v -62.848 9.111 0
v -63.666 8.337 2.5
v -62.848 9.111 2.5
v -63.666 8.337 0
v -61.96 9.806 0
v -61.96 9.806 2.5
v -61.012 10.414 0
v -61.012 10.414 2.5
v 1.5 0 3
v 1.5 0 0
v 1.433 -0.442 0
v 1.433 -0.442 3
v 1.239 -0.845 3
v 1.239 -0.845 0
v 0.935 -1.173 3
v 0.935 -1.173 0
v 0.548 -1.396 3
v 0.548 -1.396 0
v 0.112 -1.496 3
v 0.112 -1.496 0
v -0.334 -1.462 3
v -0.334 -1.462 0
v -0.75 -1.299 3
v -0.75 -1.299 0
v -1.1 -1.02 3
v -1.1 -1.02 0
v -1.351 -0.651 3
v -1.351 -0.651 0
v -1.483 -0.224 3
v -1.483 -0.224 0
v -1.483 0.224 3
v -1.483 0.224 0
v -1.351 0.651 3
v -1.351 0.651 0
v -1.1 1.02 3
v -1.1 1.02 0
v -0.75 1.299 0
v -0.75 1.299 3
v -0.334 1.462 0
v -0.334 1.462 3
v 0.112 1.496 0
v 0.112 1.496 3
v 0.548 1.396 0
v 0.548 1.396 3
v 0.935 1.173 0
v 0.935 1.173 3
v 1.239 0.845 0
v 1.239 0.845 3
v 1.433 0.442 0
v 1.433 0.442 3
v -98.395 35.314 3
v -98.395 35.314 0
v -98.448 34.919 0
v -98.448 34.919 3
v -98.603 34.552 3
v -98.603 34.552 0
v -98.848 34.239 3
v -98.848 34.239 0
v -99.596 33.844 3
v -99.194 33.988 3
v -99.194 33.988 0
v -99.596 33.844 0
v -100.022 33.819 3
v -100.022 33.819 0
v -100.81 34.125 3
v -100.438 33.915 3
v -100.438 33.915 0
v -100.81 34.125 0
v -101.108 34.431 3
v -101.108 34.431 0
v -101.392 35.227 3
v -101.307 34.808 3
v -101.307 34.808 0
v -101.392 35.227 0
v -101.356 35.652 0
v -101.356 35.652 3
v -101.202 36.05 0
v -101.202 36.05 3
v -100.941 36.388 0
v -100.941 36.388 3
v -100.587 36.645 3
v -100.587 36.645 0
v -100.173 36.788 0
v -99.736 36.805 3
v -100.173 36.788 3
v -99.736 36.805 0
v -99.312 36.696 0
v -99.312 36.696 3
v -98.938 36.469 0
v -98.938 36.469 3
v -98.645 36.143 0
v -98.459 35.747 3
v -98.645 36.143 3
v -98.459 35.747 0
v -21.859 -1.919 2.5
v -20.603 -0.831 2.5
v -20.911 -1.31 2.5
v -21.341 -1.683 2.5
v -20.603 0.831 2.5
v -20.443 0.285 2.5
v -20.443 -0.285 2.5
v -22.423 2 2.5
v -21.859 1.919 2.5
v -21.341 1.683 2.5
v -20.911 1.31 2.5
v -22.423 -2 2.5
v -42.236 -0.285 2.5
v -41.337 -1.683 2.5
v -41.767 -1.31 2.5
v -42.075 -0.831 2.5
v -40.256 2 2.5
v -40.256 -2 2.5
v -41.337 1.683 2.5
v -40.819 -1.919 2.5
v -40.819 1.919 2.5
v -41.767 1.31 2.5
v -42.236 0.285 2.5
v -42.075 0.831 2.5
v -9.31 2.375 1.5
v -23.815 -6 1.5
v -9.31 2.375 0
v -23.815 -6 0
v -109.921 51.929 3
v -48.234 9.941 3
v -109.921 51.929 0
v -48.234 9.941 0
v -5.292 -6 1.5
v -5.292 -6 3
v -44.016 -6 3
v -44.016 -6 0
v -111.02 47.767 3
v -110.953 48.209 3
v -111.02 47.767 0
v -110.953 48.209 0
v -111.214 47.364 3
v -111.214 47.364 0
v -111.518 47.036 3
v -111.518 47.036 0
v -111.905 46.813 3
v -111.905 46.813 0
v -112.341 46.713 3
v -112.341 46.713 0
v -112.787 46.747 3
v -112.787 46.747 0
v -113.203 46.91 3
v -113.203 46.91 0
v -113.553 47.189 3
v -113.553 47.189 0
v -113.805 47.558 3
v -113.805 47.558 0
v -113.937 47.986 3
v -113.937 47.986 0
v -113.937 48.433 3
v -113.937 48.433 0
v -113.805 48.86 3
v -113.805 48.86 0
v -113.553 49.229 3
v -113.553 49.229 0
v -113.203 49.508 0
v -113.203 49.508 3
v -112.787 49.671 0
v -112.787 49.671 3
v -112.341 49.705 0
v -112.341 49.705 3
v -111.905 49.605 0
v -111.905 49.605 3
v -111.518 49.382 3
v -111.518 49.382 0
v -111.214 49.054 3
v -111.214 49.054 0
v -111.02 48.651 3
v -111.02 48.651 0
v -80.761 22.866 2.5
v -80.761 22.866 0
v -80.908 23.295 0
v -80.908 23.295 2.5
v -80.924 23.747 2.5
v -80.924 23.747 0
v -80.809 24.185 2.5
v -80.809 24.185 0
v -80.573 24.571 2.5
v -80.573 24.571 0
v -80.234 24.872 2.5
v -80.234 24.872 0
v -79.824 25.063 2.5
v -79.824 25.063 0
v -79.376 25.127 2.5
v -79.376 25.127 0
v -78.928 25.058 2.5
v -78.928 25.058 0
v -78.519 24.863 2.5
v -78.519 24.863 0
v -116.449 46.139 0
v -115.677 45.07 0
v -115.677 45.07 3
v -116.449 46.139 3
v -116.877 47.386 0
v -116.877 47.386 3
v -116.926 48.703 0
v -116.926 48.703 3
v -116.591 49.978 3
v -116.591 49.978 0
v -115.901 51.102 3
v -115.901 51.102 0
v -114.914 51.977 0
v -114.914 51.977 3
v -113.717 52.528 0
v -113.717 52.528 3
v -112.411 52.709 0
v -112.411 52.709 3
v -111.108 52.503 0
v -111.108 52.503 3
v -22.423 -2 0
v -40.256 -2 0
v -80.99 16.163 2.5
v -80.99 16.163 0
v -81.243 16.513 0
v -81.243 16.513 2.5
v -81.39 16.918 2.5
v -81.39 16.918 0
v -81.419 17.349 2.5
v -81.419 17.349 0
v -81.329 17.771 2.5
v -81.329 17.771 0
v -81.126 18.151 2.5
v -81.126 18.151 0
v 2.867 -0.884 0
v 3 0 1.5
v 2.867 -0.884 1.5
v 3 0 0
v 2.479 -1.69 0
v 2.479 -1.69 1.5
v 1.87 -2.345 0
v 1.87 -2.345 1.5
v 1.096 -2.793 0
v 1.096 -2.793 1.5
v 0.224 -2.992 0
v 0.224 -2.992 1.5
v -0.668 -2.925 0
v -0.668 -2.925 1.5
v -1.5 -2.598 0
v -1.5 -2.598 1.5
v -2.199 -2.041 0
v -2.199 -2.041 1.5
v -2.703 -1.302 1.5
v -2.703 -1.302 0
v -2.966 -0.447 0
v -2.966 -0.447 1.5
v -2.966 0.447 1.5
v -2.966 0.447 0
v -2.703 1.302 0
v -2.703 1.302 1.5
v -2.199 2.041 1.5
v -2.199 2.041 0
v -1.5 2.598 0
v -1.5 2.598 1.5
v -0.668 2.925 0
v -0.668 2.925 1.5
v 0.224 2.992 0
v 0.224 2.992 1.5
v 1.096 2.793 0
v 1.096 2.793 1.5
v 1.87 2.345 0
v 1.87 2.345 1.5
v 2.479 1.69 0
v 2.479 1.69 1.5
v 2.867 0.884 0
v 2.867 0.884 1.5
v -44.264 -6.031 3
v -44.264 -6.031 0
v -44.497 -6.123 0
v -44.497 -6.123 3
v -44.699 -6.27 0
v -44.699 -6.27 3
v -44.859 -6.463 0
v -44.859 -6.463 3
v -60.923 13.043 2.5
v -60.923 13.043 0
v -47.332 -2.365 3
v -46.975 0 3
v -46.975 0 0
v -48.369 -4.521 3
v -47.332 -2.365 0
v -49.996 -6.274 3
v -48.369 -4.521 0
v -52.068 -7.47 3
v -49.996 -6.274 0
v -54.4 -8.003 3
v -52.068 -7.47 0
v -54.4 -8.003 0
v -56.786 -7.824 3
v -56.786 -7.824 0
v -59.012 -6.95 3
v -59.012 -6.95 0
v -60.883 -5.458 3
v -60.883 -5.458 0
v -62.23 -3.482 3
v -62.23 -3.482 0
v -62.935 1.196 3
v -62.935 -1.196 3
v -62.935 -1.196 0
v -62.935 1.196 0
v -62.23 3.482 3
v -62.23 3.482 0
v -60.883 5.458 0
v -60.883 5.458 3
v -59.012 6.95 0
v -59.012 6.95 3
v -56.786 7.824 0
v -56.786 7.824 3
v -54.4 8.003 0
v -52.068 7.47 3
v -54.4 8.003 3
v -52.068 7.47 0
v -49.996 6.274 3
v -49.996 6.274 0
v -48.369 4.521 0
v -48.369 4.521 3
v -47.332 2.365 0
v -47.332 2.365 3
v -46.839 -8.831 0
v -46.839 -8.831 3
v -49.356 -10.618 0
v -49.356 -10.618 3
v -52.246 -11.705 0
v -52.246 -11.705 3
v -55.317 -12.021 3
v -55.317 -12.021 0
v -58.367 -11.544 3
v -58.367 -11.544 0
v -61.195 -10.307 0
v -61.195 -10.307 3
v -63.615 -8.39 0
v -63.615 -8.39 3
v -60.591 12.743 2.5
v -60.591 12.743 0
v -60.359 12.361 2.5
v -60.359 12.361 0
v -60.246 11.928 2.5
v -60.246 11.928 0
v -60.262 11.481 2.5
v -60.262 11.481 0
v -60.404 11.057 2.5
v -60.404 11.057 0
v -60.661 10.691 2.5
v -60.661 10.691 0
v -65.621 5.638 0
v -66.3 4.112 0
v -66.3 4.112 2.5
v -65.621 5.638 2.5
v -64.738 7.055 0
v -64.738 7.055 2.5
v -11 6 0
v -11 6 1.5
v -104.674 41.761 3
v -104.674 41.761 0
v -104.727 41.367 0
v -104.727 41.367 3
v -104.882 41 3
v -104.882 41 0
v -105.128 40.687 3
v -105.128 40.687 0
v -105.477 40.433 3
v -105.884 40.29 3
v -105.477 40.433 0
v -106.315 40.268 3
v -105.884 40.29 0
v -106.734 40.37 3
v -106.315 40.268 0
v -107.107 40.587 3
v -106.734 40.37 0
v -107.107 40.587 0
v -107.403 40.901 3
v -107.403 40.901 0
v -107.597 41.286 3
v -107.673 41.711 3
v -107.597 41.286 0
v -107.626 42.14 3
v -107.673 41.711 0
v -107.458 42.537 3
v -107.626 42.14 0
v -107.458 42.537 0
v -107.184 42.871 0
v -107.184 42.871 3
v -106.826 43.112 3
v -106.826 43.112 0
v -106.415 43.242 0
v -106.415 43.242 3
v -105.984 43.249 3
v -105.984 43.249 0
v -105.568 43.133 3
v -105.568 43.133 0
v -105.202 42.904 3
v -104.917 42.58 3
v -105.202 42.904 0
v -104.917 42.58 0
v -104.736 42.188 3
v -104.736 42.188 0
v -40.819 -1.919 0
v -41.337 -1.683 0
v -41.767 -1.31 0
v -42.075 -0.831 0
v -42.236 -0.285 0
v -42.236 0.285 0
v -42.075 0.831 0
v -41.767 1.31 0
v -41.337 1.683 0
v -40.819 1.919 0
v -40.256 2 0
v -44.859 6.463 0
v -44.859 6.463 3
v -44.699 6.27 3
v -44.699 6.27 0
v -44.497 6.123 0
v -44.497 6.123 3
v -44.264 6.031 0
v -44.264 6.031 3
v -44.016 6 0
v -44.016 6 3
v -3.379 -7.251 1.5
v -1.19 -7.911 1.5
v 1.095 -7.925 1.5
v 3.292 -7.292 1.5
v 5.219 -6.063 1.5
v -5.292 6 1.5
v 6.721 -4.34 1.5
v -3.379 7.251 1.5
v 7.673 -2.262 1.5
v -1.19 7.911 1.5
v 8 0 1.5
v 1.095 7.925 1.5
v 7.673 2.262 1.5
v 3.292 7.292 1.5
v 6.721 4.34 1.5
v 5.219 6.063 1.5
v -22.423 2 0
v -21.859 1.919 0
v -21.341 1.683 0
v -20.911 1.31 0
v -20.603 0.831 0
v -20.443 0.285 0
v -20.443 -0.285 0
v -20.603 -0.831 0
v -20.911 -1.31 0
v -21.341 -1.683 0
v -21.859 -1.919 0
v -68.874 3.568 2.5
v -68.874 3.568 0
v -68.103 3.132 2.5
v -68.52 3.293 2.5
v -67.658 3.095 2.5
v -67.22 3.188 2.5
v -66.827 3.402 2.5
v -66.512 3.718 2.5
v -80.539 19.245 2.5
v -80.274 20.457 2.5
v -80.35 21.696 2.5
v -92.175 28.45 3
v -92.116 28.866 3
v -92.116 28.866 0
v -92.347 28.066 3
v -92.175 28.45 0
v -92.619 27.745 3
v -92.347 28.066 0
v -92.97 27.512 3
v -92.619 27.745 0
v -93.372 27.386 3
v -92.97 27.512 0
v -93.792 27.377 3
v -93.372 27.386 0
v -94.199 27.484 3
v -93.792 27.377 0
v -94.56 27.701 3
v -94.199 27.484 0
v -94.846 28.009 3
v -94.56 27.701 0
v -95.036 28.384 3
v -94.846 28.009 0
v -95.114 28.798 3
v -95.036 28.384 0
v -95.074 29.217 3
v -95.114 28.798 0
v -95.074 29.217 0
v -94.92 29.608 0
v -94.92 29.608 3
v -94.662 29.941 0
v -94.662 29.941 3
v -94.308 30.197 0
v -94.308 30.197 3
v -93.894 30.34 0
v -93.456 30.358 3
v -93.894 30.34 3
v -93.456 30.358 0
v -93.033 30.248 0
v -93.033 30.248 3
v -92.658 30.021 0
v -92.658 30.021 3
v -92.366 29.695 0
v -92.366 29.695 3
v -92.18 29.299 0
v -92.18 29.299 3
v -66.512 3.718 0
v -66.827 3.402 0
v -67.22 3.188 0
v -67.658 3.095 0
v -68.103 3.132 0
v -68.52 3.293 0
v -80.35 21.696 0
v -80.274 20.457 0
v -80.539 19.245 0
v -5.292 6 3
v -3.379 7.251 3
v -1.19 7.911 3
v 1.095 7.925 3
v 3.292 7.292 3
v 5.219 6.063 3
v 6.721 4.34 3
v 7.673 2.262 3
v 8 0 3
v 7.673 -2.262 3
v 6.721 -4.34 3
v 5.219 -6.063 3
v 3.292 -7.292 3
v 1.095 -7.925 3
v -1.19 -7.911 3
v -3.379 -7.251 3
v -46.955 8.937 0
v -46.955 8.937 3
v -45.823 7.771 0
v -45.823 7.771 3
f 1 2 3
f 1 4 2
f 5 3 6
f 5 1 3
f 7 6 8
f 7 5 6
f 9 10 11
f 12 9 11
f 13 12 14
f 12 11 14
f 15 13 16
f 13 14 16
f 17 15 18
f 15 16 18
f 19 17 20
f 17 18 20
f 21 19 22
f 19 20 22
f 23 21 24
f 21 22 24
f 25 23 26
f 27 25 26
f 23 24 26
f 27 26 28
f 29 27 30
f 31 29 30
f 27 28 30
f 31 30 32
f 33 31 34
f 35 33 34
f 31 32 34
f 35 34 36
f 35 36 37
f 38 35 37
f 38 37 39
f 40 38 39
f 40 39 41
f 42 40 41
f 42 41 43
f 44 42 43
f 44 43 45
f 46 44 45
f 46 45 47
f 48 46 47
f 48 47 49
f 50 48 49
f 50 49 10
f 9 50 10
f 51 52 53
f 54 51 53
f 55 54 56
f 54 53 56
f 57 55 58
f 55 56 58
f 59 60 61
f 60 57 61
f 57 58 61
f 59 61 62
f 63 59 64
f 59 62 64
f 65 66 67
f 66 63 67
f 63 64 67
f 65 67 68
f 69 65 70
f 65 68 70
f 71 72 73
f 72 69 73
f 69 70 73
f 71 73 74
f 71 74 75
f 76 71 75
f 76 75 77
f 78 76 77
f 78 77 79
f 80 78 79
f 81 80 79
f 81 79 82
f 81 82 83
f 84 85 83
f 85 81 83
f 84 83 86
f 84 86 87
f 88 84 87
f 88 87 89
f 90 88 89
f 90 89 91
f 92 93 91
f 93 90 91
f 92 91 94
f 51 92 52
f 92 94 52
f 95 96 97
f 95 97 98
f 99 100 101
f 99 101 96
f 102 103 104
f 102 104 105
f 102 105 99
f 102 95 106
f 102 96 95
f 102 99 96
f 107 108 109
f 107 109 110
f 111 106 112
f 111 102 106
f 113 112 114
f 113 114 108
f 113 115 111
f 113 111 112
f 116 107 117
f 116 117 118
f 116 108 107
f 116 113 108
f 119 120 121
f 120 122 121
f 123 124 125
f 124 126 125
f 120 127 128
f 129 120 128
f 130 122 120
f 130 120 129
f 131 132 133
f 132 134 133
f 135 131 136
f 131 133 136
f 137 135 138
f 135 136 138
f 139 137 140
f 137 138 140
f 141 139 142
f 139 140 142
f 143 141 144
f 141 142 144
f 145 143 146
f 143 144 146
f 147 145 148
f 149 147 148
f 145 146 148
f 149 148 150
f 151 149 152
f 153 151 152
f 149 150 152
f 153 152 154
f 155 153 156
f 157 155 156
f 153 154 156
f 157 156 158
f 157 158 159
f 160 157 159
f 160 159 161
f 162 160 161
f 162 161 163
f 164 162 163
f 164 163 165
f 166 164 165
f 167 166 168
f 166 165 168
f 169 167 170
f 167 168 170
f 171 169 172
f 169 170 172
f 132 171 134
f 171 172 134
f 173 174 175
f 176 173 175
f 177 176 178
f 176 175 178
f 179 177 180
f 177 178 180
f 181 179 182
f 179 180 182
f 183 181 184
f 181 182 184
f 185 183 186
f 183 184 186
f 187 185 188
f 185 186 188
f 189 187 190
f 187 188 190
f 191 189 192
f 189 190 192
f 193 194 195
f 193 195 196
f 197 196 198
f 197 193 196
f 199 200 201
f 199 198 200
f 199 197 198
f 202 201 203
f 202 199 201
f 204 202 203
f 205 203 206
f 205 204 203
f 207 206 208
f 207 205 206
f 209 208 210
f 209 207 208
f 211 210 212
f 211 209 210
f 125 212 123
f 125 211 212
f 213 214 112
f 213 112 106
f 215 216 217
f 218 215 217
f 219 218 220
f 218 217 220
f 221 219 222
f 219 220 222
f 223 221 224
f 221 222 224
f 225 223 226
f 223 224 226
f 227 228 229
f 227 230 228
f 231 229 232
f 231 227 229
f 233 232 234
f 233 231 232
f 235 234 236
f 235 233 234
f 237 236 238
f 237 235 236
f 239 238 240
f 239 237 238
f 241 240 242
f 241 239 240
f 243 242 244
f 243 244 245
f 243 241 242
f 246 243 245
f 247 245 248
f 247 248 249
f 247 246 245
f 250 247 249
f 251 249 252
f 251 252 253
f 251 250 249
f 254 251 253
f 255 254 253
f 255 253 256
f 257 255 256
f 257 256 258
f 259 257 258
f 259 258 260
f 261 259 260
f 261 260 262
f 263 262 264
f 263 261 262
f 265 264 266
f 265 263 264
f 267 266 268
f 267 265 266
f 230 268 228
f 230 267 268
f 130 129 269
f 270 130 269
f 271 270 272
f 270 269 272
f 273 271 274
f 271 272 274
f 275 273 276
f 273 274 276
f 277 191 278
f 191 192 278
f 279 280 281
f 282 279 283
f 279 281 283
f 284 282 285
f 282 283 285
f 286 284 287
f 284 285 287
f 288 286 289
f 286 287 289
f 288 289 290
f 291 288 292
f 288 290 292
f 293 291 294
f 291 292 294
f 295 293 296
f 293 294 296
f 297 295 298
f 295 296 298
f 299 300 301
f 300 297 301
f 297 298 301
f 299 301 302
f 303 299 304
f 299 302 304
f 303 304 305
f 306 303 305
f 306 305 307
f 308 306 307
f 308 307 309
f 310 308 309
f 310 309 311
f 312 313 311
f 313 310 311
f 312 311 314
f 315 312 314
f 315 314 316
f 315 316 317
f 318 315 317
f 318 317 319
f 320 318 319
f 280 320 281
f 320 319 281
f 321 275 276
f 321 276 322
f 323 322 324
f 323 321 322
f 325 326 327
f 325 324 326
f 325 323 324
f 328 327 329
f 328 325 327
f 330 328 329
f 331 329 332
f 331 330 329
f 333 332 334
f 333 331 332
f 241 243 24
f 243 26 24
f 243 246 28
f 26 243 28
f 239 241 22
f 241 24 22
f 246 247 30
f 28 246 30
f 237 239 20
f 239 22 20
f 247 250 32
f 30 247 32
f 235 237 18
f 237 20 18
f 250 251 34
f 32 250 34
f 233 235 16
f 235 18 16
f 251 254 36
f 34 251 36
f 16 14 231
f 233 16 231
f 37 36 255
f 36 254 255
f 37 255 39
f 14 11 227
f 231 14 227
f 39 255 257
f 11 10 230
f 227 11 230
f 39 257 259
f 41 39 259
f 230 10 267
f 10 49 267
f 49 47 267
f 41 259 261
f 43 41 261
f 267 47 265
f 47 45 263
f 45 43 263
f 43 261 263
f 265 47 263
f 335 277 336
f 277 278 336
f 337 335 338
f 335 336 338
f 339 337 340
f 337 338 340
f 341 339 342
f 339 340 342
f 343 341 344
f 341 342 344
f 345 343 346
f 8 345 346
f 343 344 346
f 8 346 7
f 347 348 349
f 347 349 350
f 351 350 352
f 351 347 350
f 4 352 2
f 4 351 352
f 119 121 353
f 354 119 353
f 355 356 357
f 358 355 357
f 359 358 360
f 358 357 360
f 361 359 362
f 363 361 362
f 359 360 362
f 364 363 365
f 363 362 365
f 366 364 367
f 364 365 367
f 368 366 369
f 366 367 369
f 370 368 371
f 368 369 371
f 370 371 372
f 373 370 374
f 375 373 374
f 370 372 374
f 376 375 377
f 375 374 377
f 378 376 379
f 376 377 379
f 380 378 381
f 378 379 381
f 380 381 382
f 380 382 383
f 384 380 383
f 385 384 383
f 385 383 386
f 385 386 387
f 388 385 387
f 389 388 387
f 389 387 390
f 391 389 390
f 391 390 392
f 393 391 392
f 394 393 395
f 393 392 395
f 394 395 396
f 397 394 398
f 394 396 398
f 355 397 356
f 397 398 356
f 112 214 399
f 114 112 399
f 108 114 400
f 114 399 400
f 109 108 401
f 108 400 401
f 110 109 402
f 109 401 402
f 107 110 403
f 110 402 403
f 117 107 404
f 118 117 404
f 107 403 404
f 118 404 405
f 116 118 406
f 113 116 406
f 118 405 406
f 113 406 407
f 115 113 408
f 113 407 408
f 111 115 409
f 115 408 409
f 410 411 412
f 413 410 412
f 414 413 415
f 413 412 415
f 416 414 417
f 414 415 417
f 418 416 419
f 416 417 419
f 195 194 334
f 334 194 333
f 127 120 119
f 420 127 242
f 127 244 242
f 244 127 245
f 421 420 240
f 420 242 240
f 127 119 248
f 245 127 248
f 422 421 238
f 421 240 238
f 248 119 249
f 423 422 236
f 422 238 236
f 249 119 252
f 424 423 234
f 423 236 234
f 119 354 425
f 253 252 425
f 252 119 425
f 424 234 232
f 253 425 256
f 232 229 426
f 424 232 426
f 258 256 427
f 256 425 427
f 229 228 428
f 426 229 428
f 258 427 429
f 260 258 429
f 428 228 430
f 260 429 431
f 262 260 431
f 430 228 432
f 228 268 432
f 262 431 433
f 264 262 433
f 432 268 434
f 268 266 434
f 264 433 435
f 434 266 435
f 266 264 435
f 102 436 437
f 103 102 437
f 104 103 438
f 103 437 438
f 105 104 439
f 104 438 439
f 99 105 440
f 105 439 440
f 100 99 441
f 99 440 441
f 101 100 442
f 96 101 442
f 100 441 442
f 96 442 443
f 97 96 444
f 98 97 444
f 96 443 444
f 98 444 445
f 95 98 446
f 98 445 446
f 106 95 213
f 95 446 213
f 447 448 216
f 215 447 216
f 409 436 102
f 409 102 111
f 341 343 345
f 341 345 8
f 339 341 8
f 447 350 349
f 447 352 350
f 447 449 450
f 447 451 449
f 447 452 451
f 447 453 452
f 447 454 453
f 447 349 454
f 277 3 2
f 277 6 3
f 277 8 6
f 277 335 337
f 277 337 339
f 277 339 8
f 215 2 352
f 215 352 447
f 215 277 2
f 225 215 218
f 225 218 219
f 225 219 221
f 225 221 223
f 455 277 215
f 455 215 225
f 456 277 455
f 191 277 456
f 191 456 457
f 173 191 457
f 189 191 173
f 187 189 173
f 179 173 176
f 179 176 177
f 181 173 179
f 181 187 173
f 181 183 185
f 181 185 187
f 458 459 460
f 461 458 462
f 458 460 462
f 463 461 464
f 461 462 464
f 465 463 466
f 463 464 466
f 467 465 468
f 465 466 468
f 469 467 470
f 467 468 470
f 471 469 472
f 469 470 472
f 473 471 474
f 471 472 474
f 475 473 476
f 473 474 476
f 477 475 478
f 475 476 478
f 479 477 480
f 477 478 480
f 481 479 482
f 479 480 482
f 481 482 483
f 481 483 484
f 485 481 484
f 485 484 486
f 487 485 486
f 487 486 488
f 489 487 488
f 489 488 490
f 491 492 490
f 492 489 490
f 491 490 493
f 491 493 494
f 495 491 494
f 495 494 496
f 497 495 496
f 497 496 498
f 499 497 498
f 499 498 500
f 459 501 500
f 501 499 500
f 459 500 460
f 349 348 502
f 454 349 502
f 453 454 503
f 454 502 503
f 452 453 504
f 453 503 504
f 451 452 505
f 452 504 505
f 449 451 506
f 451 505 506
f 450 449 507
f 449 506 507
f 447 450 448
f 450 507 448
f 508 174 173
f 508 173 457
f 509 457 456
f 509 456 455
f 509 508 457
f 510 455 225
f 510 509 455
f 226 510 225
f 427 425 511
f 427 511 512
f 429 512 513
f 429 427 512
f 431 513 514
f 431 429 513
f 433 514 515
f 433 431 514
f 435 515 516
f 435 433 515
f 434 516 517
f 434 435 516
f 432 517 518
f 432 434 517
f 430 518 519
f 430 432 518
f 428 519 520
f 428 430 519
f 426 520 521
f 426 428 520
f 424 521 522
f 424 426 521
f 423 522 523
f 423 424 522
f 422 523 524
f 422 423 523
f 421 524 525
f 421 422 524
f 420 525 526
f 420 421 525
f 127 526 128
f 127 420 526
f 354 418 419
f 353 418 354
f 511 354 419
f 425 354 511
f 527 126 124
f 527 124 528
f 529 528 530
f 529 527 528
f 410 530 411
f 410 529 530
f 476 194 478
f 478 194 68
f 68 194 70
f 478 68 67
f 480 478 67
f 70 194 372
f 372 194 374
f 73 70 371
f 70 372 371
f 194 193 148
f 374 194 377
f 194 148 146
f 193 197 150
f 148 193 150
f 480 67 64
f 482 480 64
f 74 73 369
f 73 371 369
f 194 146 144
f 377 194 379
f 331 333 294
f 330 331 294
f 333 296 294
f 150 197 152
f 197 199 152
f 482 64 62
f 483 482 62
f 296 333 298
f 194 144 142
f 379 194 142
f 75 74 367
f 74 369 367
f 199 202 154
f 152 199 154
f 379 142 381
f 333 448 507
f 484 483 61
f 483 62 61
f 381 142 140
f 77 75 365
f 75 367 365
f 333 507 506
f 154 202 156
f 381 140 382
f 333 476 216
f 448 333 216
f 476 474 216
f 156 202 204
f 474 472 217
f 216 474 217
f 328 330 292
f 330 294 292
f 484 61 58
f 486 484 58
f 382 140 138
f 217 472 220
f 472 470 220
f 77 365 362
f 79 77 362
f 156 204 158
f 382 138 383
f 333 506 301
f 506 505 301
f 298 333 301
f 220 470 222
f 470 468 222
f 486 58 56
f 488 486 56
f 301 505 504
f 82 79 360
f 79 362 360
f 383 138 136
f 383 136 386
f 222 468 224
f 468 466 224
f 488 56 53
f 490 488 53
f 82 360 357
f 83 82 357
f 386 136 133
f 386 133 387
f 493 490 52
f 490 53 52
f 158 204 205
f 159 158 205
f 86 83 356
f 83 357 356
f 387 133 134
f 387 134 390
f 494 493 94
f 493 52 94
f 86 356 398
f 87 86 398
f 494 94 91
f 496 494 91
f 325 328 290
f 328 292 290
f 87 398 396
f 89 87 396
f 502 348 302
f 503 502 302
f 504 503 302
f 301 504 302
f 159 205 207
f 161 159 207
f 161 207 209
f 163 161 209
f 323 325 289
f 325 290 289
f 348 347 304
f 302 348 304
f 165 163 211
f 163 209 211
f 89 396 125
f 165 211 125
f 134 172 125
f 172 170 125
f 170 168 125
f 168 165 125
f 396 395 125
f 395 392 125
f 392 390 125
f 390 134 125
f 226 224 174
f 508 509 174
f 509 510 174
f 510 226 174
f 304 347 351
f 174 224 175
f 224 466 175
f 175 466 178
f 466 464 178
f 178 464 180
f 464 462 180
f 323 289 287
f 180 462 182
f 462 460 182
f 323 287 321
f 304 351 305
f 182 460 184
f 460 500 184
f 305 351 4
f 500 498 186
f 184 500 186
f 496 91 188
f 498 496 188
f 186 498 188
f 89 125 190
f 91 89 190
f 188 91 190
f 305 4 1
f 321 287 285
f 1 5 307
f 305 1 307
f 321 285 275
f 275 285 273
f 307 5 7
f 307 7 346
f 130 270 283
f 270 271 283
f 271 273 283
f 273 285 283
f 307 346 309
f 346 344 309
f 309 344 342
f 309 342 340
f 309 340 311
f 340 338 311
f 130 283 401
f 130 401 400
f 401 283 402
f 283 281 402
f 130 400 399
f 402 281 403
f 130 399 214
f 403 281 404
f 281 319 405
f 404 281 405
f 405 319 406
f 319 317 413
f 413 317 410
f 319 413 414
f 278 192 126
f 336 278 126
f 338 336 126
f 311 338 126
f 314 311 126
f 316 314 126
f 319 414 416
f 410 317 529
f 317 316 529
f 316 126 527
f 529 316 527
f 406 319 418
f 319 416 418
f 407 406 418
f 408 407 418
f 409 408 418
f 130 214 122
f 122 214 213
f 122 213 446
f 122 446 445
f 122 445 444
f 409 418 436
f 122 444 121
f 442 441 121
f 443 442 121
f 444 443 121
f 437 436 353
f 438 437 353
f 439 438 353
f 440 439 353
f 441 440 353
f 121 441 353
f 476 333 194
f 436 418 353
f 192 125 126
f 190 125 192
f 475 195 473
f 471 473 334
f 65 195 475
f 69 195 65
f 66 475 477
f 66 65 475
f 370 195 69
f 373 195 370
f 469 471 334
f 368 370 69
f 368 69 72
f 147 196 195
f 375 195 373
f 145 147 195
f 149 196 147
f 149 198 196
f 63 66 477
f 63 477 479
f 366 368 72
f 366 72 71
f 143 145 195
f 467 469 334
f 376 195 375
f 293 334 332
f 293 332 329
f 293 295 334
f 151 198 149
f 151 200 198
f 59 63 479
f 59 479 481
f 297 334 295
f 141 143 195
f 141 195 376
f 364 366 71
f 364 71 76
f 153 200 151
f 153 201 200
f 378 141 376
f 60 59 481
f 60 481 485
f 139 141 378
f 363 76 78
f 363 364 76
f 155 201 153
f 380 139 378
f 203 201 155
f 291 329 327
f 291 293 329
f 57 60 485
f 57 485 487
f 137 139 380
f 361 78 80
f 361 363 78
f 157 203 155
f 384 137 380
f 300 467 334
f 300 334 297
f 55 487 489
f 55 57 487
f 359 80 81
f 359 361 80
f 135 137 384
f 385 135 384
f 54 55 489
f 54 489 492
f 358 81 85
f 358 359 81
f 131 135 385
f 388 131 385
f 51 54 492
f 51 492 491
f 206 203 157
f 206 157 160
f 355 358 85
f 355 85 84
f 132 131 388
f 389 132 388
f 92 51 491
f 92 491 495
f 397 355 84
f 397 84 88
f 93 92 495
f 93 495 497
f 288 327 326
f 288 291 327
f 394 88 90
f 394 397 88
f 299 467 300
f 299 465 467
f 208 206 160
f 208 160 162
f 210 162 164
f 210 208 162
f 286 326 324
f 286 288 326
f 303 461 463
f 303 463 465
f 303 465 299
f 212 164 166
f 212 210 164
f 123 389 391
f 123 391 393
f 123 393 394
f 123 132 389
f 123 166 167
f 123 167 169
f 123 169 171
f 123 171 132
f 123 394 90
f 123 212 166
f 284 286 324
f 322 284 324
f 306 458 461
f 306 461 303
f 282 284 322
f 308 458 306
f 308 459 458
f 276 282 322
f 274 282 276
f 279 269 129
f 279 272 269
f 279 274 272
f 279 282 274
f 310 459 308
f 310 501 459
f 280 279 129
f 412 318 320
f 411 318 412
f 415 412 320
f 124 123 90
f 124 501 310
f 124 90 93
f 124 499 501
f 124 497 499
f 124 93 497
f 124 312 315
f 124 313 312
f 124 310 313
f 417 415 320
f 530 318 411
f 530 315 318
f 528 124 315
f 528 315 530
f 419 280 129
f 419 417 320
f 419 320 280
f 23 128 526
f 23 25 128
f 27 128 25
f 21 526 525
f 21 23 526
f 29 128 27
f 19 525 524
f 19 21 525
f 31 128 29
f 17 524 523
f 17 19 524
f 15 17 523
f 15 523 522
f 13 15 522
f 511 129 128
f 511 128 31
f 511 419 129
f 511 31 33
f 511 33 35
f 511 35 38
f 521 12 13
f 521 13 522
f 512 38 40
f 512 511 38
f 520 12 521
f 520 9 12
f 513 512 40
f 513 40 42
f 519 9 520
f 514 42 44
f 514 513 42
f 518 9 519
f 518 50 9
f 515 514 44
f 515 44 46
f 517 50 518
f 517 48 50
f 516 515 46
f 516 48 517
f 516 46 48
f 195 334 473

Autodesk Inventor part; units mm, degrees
ref_plane "YZ Plane" through (0, 0, 0) normal (1, 0, 0) x (0, 1, 0)
ref_plane "XZ Plane" through (0, 0, 0) normal (0, 1, 0) x (-1, 0, 0)
ref_plane "XY Plane" through (0, 0, 0) normal (0, 0, 1) x (1, 0, 0)
sketch "スケッチ1" plane through (0, 0, 0) normal (0, 0, 1) x (1, 0, 0)
  circle A0 centre (-55, 0) radius 8.025
  circle A1 centre (-55, 0) radius 12.025
  line L0 (6, -6) -> (-61, -6)
  line L1 (-61, -6) -> (-61, 6)
  line L2 (-61, 6) -> (6, 6)
  line L3 (-61, -6) -> (-61, 6)
  line L4 (-20.8557, 4.9841) -> (202.5072, 4.9841) construction
  circle A2 centre (0, 0) radius 8
  line L5 (-23.9175, 26.3005) -> (3.7655, 4.6721)
  circle A3 centre (0, 0) radius 1.5
  circle A4 centre (0, 0) radius 3
  line L6 (-23.8151, -6) -> (-9.3095, 2.3748)
  line L7 (-9.3095, 2.3748) -> (-11, 6)
  line L8 (-55, 0) -> (0, 0)
  line L9 (0, 0) -> (0, 6)
  line L10 (-55, 0) -> (-112.4533, 48.2091)
  circle A5 centre (-112.4533, 48.2091) radius 4.5
  line L11 (-48.2337, 9.9407) -> (-109.9213, 51.9291)
  line L12 (-115.6772, 45.0695) -> (-63.6148, -8.3897)
  circle A6 centre (-112.4533, 48.2091) radius 1.5
  line L13 (-112.4533, 48.2091) -> (-74.1421, 8.87)
  circle A7 centre (-106.1742, 41.7614) radius 1.5
  circle A8 centre (-99.895, 35.3138) radius 1.5
  circle A9 centre (-93.6158, 28.8662) radius 1.5
  circle A10 centre (-57.5782, 13.277) radius 1.5
  circle A11 centre (-55, 0) radius 11 construction
  circle A12 centre (-57.5782, 13.277) radius 2.5
  point P0 (-62.7295, -9.2117)
  point P1 (-47.2705, 9.2117)
  point P2 (-5.2915, 6)
  point P3 (-5.2915, -6)
  point P4 (-44.5788, 6)
  point P5 (-44.5788, -6)
  point P6 (-49.6708, 6)
  point P7 (-49.6708, -6)
  point P8 (-60.3292, -6)
  point P9 (-61, -5.3292)
  point P10 (-61, 5.3292)
  point P11 (-60.3292, 6)
  point P12 (2.066, 6)
  point P13 (5.2915, -6)
  point P14 (5.2915, 6)
  point P15 (-57.2923, 11.8045)
  point P16 (-56.1715, 15.3437)
  point P17 (-55.4185, 12.0177)
  point P18 (-59.1096, 11.301)
  dimension "d1" = 16.05
  dimension "d3" = 4
  dimension "d19" = 38
  dimension "d35" = 16
  dimension "d36" = 3
  dimension "d37" = 6
  dimension "d38" = 55
  dimension "d39" = 6
  dimension "d40" = 6
  dimension "d42" = 65
  dimension "d43" = 11
  dimension "d44" = 4
  dimension "d45" = 30
  dimension "d47" = 75
  dimension "d50" = 9
  dimension "d51" = 3
  dimension "d54" = 9
  dimension "d59" = 140
  dimension "d63" = 9
  dimension "d67" = 3
  dimension "d68" = 22
  dimension "d69" = 1
extrude "押し出し1" add sketch "スケッチ1" along normal blind 3 contours L8 A1 L0 A0 | A0 L2 A1 L8 | A0 L2 L1 L10 A1 A12 | L0 A1 L10 A0 L1 | L8 L6 L0 A1 | A1 L2 L7 L6 L8 | A0 L1 L2 | L0 L1 A0 | L8 A2 L0 L6 | L6 L7 L2 A2 L8 | A1 A12 L11 | L12 A5 L13 A7 L10 A1 | L8 A4 L9 L2 A2 L0 | A2 L2 L9 A4 L8 | A12 A1 | A10 | A1 A12 | A12 A1 L10 A7 A5 L11 | A2 L5 L2 | A5 L10 A6 L13 | L0 A2 | L8 A3 L9 A4 | A4 L9 A3 L8 | A2 L2 L5 | L13 A6 L10 A5 | A5 L10 A7 L13
extrude "押し出し3" cut sketch "スケッチ1" along normal blind 1.5 contours L8 A2 L0 L6 | L6 L7 L2 A2 L8 | L8 A4 L9 L2 A2 L0 | A2 L2 L9 A4 L8 | A2 L5 L2 | L0 A2 | A2 L2 L5
sketch "スケッチ2" plane through (0, 0, 3) normal (0, 0, 1) x (1, 0, 0)
  circle A0 centre (-55, 0) radius 8.025 projected
  circle A1 centre (0, 0) radius 1.5 projected
  arc A2 (-44.5788, 6) -> (-48.2337, 9.9407) centre (-55, 0) ccw projected
  line L0 (-48.2337, 9.9407) -> (-109.9213, 51.9291) projected
  arc A3 (-109.9213, 51.9291) -> (-115.6772, 45.0695) centre (-112.4533, 48.2091) ccw projected
  line L1 (-115.6772, 45.0695) -> (-63.6148, -8.3897) projected
  arc A4 (-63.6148, -8.3897) -> (-44.5788, -6) centre (-55, 0) ccw projected
  line L2 (-44.5788, -6) -> (-5.2915, -6) projected
  arc A5 (-5.2915, -6) -> (-5.2915, 6) centre (0, 0) ccw projected
  line L3 (-5.2915, 6) -> (-44.5788, 6) projected
  circle A6 centre (-112.4533, 48.2091) radius 1.5 projected
  circle A7 centre (-93.6158, 28.8662) radius 1.5 projected
  circle A8 centre (-99.895, 35.3138) radius 1.5 projected
  circle A9 centre (-106.1742, 41.7614) radius 1.5 projected
  dimension "d64" = 9
  dimension "d65" = 9
  dimension "d66" = 9
sketch "スケッチ3" plane through (0, 0, 0) normal (0, 0, -1) x (-1, 0, 0)
  circle A0 centre (106.1742, 41.7614) radius 1.5 projected
  circle A1 centre (99.895, 35.3138) radius 1.5 projected
  circle A2 centre (93.6158, 28.8662) radius 1.5 projected
  circle A3 centre (112.4533, 48.2091) radius 1.5 projected
  line L0 (11, 6) -> (9.3095, 2.3748) projected
  line L1 (9.3095, 2.3748) -> (23.8151, -6) projected
  line L2 (44.5788, -6) -> (23.8151, -6) projected
  arc A4 (44.5788, -6) -> (63.6148, -8.3897) centre (55, 0) ccw projected
  line L3 (115.6772, 45.0695) -> (63.6148, -8.3897) projected
  arc A5 (115.6772, 45.0695) -> (109.9213, 51.9291) centre (112.4533, 48.2091) ccw projected
  line L4 (48.2337, 9.9407) -> (109.9213, 51.9291) projected
  arc A6 (48.2337, 9.9407) -> (44.5788, 6) centre (55, 0) ccw projected
  line L5 (11, 6) -> (44.5788, 6) projected
  circle A7 centre (55, 0) radius 8.025 projected
  arc A8 (78.5193, -24.8633) -> (80.7612, -22.8663) centre (79.3836, -23.5767) ccw
  line L6 (78.5193, -24.8633) -> (60.9226, -13.0433)
  arc A9 (61.0119, -10.4143) -> (60.9226, -13.0433) centre (61.7868, -11.7567) ccw
  arc A10 (61.0119, -10.4143) -> (66.3, -4.1122) centre (55, 0) ccw
  arc A11 (68.8736, -3.5676) -> (66.3, -4.1122) centre (67.7566, -4.6422) ccw
  line L7 (68.8736, -3.5676) -> (80.9904, -16.1632)
  arc A12 (81.1255, -18.1514) -> (80.9904, -16.1632) centre (79.8733, -17.2378) ccw
  arc A13 (81.1255, -18.1514) -> (80.7612, -22.8663) centre (84.7607, -20.8038) ccw
  arc A14 (40.2559, -2) -> (40.2559, 2) centre (40.2559, 0) ccw
  line L8 (40.2559, -2) -> (22.4227, -2)
  arc A15 (22.4227, 2) -> (22.4227, -2) centre (22.4227, 0) ccw
  line L9 (22.4227, 2) -> (40.2559, 2)
  line L10 (9.3095, -2.3748) -> (11, -6)
  line L11 (44.5788, -6) -> (11, -6)
  arc A16 (44.5788, -6) -> (48.2949, -9.9821) centre (55, 0) ccw
  line L12 (102.7709, -46.5745) -> (48.2949, -9.9821)
  arc A17 (102.7709, -46.5745) -> (109.1623, -38.9576) centre (105.5589, -42.424) ccw
  line L13 (63.6661, 8.3366) -> (109.1623, -38.9576)
  arc A18 (63.6661, 8.3366) -> (44.5788, 6) centre (55, 0) ccw
  line L14 (23.8151, 6) -> (44.5788, 6)
  line L15 (23.8151, 6) -> (9.3095, -2.3748)
  circle A19 centre (55, 0) radius 8.025
  circle A20 centre (84.7607, -20.8038) radius 1.5
  circle A21 centre (105.5589, -42.424) radius 1.5
  circle A22 centre (91.6934, -28.0105) radius 1.5
  circle A23 centre (98.6262, -35.2172) radius 1.5
  line L16 (55, 0) -> (46.975, 0)
  arc A24 (80.7612, 22.8663) -> (78.5193, 24.8633) centre (79.3836, 23.5767) ccw
  line L17 (78.5193, 24.8633) -> (60.9226, 13.0433)
  arc A25 (60.9226, 13.0433) -> (61.0119, 10.4143) centre (61.7868, 11.7567) ccw
  arc A26 (66.3, 4.1122) -> (61.0119, 10.4143) centre (55, 0) ccw
  arc A27 (66.3, 4.1122) -> (68.8736, 3.5676) centre (67.7566, 4.6422) ccw
  line L18 (68.8736, 3.5676) -> (80.9904, 16.1632)
  arc A28 (80.9904, 16.1632) -> (81.1255, 18.1514) centre (79.8733, 17.2378) ccw
  arc A29 (80.7612, 22.8663) -> (81.1255, 18.1514) centre (84.7607, 20.8038) ccw
  arc A30 (40.2559, -2) -> (40.2559, 2) centre (40.2559, 0) ccw
  line L19 (40.2559, 2) -> (22.4227, 2)
  arc A31 (22.4227, 2) -> (22.4227, -2) centre (22.4227, 0) ccw
  line L20 (22.4227, -2) -> (40.2559, -2)
  point P0 (0, 0)
  point P1 (0, 0)
  point P2 (61.0119, 10.4143)
extrude "押し出し4" cut sketch "スケッチ3" against normal blind 2.5 contours A25 L17 A24 A29 A28 L18 A27 L13 A18 | L13 A27 A26 | L8 A15 L9 A14
fillet "フィレット2" radius 1 2 edges at (-44.5788, 6, 1.5) (-44.5788, -6, 1.5)
properties part number "アーム中間その弐" material "アルミニウム 7075"
